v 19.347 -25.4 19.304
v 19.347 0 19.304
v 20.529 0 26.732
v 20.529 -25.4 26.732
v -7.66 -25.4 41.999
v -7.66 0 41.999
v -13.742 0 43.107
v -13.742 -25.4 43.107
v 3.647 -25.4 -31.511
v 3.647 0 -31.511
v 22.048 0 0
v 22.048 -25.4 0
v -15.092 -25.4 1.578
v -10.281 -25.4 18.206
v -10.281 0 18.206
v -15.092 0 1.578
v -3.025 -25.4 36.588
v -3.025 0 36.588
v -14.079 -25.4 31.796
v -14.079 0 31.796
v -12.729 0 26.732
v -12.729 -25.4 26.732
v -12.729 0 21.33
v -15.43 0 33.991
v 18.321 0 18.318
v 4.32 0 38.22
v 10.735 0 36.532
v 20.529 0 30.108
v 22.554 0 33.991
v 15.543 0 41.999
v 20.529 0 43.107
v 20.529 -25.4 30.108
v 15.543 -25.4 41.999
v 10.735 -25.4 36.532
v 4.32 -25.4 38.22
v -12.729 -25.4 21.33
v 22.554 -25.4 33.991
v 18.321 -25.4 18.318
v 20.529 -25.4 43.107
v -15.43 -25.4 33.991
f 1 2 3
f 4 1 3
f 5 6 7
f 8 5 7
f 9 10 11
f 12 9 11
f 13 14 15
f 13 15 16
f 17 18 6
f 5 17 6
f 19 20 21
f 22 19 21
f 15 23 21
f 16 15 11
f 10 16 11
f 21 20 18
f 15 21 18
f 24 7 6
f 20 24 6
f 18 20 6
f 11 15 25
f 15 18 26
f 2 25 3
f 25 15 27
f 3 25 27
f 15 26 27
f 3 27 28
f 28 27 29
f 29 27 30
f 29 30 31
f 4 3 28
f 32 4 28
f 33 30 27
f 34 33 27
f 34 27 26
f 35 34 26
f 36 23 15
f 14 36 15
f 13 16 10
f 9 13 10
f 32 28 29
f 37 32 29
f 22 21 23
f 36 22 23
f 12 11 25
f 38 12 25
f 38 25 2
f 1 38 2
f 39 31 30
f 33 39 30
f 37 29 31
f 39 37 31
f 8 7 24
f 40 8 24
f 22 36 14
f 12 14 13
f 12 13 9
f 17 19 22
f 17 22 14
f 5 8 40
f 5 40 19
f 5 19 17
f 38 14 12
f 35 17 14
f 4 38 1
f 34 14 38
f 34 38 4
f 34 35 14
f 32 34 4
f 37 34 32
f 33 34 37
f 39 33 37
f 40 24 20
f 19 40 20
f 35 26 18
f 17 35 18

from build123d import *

# Parameters (mm, degrees)
F1_DEPTH = 25.4


with BuildPart() as f1:
    # F0 (on Front) → F1 (new body)
    with BuildSketch(Plane.XZ):
        Polygon((-7.659892, 41.999251), (-13.7416, 43.107137), (-15.429787, 33.990927), (-14.079237, 31.79628), (-12.728688, 26.731718), (-12.728688, 25.212349), (-12.728688, 21.329518), (-10.280816, 18.206371), (-7.832943, 15.083224), (-4.794206, 9.343385), (-1.586649, 5.460554), (3.646733, 4.110004), (7.023108, 4.110004), (10.905939, 7.824017), (14.95759, 15.083224), (18.321248, 18.31751), (19.346878, 19.303693), (20.528609, 26.731718), (20.528609, 30.10809), (22.554435, 33.990927), (20.528609, 43.107137), (15.543124, 41.999251), (10.735117, 36.532301), (4.320004, 38.220487), (-3.025021, 36.588258), align=None)
        Polygon((-7.832943, 15.083224), (-10.280816, 18.206371), (-15.09215, 1.577722), (3.646733, -31.510755), (22.047978, 0), (18.321248, 18.31751), (14.95759, 15.083224), (10.905939, 7.824017), (7.023108, 4.110004), (3.646733, 4.110004), (-1.586649, 5.460554), (-4.794206, 9.343385), align=None)
    extrude(amount=F1_DEPTH)


solid = f1.part
